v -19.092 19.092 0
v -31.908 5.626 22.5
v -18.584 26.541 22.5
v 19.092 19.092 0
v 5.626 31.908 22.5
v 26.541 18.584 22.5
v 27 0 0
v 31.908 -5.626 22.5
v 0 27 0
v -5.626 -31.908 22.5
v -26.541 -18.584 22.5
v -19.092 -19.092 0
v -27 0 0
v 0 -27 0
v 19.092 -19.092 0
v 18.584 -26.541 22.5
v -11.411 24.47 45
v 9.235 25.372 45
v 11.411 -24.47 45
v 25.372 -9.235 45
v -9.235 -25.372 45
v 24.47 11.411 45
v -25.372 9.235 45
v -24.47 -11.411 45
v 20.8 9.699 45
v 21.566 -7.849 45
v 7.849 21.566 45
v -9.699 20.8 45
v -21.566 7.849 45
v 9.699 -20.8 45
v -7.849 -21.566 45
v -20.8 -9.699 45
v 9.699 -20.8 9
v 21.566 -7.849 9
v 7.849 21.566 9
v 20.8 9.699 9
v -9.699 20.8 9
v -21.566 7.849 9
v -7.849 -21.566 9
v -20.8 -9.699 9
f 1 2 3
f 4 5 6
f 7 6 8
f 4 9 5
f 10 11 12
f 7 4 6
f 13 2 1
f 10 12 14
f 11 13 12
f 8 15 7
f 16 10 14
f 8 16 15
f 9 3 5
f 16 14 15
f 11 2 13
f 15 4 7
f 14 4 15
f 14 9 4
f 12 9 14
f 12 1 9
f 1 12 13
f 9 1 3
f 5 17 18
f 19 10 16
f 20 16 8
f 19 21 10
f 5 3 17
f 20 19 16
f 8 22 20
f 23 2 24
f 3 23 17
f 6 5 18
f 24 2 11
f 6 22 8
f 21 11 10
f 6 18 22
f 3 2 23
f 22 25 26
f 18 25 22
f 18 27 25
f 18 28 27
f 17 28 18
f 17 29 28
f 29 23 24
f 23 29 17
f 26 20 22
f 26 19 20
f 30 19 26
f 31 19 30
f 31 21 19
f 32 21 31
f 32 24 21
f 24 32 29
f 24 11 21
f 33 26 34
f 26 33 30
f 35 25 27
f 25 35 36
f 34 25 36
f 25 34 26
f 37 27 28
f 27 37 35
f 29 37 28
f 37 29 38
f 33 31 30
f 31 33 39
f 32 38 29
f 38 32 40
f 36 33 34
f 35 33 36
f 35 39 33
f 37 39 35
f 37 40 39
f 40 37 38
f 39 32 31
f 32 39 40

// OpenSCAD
$fn = 48;

difference() {
	union() {
		linear_extrude(height = 22.5000000000, scale = 1.2000000000, slices = 1.0000000000, twist = 10) {
			circle($fn = 8, r = 27);
		}
		translate(v = [0, 0, 45]) {
			rotate(a = [180, 0, -20]) {
				linear_extrude(height = 22.5000000000, scale = 1.2000000000, slices = 1.0000000000, twist = 10) {
					circle($fn = 8, r = 27);
				}
			}
		}
	}
	translate(v = [0, 0, 9.0000000000]) {
		rotate(a = -20) {
			cylinder($fn = 8, h = 45, r = 22.9500000000);
		}
	}
}
/***********************************************
*********      SolidPython code:      **********
************************************************
 
#! /usr/bin/env python
# -*- coding: UTF-8 -*-
from __future__ import division
import os
import sys
import re

# Assumes SolidPython is in site-packages or elsewhwere in sys.path
from solid import *
from solid.utils import *

SEGMENTS = 48

def shell(params):
    height = params['height']
    min_radius = params['radius']
    max_radius = min_radius * 1.2
    twist = params['twist']
    segments = params['segments']
    slices = params['slices']
    
    shape= circle(r=min_radius, segments=segments)
    obj = linear_extrude(height=height/2, twist=twist, slices=slices/2, scale=max_radius/min_radius)(shape)

    obj_mirror = up(height)(
        rotate([180,0,-2*twist])(
            obj
        )
    )

    return obj + obj_mirror

def inside(params):
    height = params['height']
    radius = params['radius'] * 0.85
    twist = params['twist']
    segments = params['segments']

    shape = cylinder(h=height, r=radius, segments=segments)

    return up(height*0.2)(rotate(-2*twist)(shape))

def assembly():
    params = {
        'height' : 45,
        'radius' : 27,
        'segments' : 8,
        'slices' : 2,
        'twist' : 10
    }

    return shell(params) - inside(params)

if __name__ == '__main__':
    use('./list-comprehension-demos/sweep.scad')

    a = assembly()
    scad_render_to_file(
        a,
        'out.scad',
        file_header='$fn = %s;' % SEGMENTS,
        include_orig_code=True
    )
 
 
************************************************/
